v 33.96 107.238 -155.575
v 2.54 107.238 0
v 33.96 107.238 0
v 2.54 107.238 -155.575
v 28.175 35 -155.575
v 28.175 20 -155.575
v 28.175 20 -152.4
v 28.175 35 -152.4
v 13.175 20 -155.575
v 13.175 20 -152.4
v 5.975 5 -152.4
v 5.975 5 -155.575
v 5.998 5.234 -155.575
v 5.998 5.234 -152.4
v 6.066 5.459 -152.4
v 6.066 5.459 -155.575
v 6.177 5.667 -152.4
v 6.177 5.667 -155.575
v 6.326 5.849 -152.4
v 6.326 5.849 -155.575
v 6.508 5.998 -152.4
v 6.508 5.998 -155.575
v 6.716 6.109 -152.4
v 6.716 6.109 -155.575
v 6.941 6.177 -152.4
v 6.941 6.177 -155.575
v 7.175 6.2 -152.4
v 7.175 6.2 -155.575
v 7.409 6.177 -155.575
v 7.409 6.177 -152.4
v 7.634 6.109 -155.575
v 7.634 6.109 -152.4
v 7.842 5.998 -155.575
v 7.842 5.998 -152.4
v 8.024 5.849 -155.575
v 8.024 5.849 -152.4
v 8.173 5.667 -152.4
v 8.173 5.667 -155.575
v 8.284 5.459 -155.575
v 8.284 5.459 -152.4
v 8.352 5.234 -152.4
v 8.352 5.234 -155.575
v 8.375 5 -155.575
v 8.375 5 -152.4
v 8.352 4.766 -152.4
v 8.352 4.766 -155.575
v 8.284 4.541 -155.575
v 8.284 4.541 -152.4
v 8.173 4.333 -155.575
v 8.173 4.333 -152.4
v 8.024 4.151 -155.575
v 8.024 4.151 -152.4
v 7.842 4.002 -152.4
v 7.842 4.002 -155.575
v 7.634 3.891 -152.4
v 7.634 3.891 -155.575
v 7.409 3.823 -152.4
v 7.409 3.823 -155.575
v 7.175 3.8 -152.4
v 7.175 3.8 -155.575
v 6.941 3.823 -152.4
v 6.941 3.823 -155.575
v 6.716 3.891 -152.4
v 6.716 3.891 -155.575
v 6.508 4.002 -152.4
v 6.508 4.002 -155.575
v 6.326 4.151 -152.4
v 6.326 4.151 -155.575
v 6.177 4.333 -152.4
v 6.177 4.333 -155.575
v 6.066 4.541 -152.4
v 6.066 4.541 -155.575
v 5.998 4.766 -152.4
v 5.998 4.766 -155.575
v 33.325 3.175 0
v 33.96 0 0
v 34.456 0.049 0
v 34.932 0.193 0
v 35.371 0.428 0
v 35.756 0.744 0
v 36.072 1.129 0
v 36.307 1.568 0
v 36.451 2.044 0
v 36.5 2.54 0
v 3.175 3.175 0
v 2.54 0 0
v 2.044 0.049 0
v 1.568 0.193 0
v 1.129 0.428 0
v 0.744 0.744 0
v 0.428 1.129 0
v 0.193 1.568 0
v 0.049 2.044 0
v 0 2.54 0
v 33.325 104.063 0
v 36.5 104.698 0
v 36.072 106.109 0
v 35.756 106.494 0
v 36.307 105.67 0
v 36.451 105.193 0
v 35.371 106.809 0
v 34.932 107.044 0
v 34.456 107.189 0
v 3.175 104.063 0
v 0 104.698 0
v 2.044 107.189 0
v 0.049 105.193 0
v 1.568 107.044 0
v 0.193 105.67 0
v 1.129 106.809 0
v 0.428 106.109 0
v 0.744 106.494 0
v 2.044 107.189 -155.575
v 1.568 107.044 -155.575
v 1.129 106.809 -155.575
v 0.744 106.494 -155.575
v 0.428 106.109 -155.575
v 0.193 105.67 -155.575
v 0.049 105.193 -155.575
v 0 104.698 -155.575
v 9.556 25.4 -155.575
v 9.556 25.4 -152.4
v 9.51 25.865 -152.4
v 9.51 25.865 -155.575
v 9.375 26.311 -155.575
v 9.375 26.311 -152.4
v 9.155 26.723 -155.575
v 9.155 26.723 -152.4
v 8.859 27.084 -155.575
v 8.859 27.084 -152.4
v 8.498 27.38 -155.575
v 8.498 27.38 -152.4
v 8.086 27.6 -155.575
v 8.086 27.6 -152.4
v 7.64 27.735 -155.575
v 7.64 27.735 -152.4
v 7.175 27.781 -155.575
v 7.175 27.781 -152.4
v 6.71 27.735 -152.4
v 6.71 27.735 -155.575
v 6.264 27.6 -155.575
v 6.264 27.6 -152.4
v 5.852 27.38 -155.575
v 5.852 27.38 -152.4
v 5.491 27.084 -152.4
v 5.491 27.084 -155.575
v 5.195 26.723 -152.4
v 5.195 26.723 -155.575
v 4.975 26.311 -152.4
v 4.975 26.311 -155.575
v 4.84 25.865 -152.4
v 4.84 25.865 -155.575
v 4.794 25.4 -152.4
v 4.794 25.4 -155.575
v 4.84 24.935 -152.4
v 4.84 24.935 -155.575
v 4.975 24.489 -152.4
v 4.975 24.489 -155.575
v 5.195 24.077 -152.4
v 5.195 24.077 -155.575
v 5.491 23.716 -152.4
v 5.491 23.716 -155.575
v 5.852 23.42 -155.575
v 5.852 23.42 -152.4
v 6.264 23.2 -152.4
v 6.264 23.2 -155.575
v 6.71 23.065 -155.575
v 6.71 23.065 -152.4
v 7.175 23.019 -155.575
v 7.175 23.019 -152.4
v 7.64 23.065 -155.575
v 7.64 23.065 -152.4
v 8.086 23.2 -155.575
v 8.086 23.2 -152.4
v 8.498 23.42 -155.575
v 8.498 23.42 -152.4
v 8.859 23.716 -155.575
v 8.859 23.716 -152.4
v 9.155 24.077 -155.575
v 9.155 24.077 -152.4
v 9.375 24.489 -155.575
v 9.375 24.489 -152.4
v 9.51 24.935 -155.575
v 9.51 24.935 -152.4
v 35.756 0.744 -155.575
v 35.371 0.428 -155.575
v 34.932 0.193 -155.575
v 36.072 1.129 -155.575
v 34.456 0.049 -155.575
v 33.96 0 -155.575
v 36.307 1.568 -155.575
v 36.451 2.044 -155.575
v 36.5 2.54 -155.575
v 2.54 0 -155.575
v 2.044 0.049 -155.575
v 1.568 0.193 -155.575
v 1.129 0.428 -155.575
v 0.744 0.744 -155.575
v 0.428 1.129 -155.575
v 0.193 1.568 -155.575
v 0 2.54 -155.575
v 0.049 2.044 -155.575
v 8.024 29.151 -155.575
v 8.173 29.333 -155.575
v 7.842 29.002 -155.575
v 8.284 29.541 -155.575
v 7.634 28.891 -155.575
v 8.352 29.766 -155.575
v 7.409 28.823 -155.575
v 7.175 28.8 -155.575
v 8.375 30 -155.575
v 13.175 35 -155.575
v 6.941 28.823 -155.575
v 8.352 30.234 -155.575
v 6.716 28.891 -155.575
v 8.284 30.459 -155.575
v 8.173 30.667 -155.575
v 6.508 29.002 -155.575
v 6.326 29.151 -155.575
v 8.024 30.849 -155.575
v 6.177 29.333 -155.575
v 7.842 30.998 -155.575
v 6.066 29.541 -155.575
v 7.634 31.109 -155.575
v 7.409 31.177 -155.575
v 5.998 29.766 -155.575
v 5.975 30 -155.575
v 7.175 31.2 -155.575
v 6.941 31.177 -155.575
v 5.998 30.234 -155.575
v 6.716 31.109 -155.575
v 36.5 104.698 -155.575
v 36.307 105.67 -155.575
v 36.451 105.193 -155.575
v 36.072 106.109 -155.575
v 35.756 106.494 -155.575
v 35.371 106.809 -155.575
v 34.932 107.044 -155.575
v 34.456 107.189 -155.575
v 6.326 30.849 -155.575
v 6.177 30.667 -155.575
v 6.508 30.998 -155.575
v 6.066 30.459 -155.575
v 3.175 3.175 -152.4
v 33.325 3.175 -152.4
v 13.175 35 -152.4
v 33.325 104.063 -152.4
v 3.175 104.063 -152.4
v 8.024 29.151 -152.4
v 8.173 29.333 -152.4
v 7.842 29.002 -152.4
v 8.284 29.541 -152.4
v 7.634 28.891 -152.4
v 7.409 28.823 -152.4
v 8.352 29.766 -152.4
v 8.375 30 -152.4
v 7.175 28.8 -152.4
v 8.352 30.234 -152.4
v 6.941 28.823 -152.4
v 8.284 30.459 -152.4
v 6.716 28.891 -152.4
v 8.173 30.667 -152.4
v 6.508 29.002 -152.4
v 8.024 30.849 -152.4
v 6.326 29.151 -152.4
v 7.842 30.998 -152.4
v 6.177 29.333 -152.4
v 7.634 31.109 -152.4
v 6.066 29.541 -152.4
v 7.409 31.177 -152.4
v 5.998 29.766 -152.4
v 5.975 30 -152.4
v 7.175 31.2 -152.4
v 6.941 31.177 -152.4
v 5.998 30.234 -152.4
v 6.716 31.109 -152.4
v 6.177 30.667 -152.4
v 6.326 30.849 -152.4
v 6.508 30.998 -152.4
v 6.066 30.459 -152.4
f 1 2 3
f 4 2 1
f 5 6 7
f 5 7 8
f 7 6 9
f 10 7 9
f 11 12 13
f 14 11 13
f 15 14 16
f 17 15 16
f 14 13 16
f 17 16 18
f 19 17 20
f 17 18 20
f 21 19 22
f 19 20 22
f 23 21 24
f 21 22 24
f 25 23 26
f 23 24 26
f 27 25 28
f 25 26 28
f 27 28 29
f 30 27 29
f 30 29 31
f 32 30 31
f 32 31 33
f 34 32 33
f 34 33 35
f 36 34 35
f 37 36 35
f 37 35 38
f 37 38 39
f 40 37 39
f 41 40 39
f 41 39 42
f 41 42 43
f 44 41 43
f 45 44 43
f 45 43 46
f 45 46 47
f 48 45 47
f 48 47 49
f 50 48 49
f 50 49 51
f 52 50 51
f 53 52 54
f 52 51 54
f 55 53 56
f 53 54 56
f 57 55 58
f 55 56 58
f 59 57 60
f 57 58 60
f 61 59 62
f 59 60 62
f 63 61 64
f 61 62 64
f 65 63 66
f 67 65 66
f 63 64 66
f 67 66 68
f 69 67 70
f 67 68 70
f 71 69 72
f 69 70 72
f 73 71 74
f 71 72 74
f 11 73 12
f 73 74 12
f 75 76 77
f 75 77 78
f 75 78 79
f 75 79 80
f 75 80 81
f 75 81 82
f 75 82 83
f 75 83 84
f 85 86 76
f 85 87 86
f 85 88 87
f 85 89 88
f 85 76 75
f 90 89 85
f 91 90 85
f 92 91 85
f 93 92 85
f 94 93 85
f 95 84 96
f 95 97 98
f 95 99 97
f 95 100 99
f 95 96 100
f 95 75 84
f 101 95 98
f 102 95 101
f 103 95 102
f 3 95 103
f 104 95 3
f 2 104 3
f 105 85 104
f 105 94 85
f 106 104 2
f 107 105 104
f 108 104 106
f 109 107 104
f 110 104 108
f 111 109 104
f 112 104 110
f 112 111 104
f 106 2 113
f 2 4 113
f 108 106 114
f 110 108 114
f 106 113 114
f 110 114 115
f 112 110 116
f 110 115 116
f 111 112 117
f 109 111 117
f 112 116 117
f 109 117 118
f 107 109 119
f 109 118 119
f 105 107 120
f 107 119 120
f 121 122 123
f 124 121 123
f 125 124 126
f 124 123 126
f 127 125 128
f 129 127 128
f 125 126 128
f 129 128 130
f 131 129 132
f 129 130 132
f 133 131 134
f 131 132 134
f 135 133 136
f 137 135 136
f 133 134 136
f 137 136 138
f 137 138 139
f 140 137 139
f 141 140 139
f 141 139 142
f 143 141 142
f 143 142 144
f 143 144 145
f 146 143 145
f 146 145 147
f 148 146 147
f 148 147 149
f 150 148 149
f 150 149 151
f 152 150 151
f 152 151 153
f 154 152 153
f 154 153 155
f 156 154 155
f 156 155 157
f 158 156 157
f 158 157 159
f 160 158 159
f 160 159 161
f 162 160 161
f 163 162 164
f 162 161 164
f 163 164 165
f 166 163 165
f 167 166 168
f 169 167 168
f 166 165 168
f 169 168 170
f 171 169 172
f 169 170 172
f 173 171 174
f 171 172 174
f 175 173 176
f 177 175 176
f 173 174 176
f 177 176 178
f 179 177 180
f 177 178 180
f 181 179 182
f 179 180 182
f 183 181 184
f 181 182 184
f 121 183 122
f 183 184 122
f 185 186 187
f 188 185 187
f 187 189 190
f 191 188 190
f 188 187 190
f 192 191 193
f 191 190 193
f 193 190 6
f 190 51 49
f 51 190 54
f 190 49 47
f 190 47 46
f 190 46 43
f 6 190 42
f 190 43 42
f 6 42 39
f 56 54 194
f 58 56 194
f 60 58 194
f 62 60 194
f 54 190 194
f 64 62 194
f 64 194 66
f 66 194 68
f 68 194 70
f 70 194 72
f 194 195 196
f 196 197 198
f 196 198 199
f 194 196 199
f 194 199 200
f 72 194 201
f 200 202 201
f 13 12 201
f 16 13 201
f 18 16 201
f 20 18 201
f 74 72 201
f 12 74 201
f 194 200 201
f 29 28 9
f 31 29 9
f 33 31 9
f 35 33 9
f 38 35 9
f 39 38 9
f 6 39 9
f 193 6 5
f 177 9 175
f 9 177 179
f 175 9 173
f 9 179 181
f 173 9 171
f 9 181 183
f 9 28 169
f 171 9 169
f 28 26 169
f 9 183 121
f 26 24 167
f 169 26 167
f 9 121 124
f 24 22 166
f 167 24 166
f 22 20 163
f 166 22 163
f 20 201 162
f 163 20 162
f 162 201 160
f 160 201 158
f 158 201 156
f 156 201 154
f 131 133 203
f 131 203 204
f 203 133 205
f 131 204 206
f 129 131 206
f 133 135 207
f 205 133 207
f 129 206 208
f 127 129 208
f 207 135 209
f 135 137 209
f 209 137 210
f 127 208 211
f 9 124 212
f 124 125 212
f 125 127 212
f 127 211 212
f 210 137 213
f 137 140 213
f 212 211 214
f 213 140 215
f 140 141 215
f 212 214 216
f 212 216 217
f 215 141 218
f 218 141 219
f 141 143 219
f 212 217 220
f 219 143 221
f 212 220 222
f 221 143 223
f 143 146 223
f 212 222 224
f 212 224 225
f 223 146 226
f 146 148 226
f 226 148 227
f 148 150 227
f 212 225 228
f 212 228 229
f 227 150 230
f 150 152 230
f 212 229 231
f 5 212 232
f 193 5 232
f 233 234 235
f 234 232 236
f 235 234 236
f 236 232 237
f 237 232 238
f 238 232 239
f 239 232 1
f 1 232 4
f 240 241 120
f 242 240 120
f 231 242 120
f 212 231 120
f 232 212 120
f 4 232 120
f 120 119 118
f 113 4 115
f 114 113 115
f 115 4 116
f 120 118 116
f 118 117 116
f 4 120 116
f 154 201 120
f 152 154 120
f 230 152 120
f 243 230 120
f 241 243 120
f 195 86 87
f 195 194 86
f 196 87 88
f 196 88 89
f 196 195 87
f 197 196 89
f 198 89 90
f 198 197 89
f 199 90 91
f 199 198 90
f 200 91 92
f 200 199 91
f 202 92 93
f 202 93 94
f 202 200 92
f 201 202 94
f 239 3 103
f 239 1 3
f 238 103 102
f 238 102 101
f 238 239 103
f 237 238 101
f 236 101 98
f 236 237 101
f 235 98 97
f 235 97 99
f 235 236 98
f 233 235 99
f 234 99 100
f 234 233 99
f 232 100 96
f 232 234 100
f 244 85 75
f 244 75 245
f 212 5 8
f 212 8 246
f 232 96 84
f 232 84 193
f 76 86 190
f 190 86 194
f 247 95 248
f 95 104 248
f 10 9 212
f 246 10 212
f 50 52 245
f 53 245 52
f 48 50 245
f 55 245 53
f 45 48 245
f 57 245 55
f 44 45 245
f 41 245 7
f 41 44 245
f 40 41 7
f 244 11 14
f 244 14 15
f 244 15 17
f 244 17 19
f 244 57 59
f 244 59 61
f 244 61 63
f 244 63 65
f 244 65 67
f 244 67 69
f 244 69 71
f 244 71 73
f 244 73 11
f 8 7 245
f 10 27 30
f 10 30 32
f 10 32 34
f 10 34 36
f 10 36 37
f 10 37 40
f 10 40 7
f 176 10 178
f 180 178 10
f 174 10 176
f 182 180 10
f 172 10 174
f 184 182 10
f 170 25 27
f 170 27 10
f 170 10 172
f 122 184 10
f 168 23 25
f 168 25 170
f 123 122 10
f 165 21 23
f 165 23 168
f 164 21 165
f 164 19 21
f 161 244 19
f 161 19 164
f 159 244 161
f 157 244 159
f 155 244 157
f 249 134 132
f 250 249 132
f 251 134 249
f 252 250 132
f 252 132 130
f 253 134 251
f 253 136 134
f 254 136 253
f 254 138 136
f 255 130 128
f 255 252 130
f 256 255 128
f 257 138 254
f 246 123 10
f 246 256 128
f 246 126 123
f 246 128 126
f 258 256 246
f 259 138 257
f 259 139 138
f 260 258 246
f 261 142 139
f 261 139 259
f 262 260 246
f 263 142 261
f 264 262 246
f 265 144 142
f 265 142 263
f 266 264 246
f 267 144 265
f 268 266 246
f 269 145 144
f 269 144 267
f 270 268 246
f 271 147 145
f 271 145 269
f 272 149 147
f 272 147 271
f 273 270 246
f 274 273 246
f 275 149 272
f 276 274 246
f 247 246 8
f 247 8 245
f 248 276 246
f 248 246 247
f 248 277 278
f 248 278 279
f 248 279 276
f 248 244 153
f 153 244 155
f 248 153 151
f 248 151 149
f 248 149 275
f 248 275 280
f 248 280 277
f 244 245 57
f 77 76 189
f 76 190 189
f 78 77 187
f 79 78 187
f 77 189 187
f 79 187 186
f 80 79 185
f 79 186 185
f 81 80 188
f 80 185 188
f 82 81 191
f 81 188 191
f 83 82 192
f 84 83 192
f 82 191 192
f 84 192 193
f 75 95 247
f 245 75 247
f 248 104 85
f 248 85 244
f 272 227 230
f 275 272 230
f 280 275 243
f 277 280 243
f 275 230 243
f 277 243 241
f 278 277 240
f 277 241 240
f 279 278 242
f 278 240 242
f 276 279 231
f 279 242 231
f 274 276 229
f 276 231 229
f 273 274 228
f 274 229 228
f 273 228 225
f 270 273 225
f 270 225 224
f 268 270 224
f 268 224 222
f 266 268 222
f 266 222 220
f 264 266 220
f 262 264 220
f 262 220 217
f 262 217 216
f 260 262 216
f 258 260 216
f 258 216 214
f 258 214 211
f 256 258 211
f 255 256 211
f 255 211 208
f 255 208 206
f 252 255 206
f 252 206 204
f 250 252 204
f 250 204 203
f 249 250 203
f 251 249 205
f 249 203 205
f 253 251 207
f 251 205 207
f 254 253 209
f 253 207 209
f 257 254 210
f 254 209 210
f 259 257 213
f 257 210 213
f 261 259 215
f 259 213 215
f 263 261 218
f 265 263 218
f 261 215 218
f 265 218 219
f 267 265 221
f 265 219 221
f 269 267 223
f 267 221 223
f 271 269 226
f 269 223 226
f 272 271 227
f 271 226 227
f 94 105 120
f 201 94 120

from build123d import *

# Parameters (mm, degrees)
SKETCH1_W           = 155.575
SKETCH1_H           = 107.237500028
BOSS_EXTRUDE1_DEPTH = 36.5
SHELL2_T            = -3.175
FILLET1_R           = 2.54
CUT_EXTRUDE2_REACH  = 194.447
SKETCH7_R           = 1.2
SKETCH7_W           = 15
SKETCH7_H           = 15
SKETCH8_R           = 2.38125
CUT_EXTRUDE3_DEPTH  = 190.889155594


with BuildPart() as part:
    # Sketch1 → Boss-Extrude1 (new body)
    with BuildSketch(Plane(origin=(0, 0, 0), x_dir=(0, 0, -1), z_dir=(1, 0, 0))):
        with Locations((77.7875, 53.618750014)):
            Rectangle(SKETCH1_W, SKETCH1_H)
    extrude(amount=BOSS_EXTRUDE1_DEPTH)

    # Shell2
    shell2_openings = [part.faces().sort_by_distance(p)[0] for p in [
        (18.25, 53.618750014, 0),
    ]]
    offset(amount=SHELL2_T, openings=shell2_openings, kind=Kind.INTERSECTION)

    # Fillet1
    fillet1_edges = [part.edges().sort_by_distance(p)[0] for p in [
        (36.5, 107.237500028, -77.7875),
        (0, 107.237500028, -77.7875),
        (0, 0, -77.7875),
        (36.5, 0, -77.7875),
    ]]
    fillet(fillet1_edges, radius=FILLET1_R)

    # Sketch7 → Cut-Extrude2 (cut, up to next)
    with BuildSketch(Plane(origin=(0, 0, -155.575), x_dir=(-1, 0, 0), z_dir=(0, 0, -1)), mode=Mode.PRIVATE) as cut_extrude2_sk1:
        with Locations((-7.175, 30)):
            Circle(SKETCH7_R)
    cut_extrude2_tool1 = extrude(cut_extrude2_sk1.sketch, amount=-CUT_EXTRUDE2_REACH, mode=Mode.PRIVATE) & part.part
    # Sketch7 → Cut-Extrude2 (cut, up to next)
    with BuildSketch(Plane(origin=(0, 0, -155.575), x_dir=(-1, 0, 0), z_dir=(0, 0, -1)), mode=Mode.PRIVATE) as cut_extrude2_sk2:
        with Locations((-7.175, 5)):
            Circle(SKETCH7_R)
    cut_extrude2_tool2 = extrude(cut_extrude2_sk2.sketch, amount=-CUT_EXTRUDE2_REACH, mode=Mode.PRIVATE) & part.part
    # Sketch7 → Cut-Extrude2 (cut, up to next)
    with BuildSketch(Plane(origin=(0, 0, -155.575), x_dir=(-1, 0, 0), z_dir=(0, 0, -1)), mode=Mode.PRIVATE) as cut_extrude2_sk3:
        with Locations((-20.675, 27.5)):
            Rectangle(SKETCH7_W, SKETCH7_H)
    cut_extrude2_tool3 = extrude(cut_extrude2_sk3.sketch, amount=-CUT_EXTRUDE2_REACH, mode=Mode.PRIVATE) & part.part
    add(cut_extrude2_tool1.solids().sort_by_distance((7.175, 30, -155.575))[0], mode=Mode.SUBTRACT)
    add(cut_extrude2_tool2.solids().sort_by_distance((7.175, 5, -155.575))[0], mode=Mode.SUBTRACT)
    add(cut_extrude2_tool3.solids().sort_by_distance((20.675, 27.5, -155.575))[0], mode=Mode.SUBTRACT)

    # Sketch8 → Cut-Extrude3 (cut, through all)
    with BuildSketch(Plane.XY.offset(-152.4)):
        with Locations((7.175, 25.4)):
            Circle(SKETCH8_R)
    extrude(amount=-CUT_EXTRUDE3_DEPTH, mode=Mode.SUBTRACT)


solid = part.part
